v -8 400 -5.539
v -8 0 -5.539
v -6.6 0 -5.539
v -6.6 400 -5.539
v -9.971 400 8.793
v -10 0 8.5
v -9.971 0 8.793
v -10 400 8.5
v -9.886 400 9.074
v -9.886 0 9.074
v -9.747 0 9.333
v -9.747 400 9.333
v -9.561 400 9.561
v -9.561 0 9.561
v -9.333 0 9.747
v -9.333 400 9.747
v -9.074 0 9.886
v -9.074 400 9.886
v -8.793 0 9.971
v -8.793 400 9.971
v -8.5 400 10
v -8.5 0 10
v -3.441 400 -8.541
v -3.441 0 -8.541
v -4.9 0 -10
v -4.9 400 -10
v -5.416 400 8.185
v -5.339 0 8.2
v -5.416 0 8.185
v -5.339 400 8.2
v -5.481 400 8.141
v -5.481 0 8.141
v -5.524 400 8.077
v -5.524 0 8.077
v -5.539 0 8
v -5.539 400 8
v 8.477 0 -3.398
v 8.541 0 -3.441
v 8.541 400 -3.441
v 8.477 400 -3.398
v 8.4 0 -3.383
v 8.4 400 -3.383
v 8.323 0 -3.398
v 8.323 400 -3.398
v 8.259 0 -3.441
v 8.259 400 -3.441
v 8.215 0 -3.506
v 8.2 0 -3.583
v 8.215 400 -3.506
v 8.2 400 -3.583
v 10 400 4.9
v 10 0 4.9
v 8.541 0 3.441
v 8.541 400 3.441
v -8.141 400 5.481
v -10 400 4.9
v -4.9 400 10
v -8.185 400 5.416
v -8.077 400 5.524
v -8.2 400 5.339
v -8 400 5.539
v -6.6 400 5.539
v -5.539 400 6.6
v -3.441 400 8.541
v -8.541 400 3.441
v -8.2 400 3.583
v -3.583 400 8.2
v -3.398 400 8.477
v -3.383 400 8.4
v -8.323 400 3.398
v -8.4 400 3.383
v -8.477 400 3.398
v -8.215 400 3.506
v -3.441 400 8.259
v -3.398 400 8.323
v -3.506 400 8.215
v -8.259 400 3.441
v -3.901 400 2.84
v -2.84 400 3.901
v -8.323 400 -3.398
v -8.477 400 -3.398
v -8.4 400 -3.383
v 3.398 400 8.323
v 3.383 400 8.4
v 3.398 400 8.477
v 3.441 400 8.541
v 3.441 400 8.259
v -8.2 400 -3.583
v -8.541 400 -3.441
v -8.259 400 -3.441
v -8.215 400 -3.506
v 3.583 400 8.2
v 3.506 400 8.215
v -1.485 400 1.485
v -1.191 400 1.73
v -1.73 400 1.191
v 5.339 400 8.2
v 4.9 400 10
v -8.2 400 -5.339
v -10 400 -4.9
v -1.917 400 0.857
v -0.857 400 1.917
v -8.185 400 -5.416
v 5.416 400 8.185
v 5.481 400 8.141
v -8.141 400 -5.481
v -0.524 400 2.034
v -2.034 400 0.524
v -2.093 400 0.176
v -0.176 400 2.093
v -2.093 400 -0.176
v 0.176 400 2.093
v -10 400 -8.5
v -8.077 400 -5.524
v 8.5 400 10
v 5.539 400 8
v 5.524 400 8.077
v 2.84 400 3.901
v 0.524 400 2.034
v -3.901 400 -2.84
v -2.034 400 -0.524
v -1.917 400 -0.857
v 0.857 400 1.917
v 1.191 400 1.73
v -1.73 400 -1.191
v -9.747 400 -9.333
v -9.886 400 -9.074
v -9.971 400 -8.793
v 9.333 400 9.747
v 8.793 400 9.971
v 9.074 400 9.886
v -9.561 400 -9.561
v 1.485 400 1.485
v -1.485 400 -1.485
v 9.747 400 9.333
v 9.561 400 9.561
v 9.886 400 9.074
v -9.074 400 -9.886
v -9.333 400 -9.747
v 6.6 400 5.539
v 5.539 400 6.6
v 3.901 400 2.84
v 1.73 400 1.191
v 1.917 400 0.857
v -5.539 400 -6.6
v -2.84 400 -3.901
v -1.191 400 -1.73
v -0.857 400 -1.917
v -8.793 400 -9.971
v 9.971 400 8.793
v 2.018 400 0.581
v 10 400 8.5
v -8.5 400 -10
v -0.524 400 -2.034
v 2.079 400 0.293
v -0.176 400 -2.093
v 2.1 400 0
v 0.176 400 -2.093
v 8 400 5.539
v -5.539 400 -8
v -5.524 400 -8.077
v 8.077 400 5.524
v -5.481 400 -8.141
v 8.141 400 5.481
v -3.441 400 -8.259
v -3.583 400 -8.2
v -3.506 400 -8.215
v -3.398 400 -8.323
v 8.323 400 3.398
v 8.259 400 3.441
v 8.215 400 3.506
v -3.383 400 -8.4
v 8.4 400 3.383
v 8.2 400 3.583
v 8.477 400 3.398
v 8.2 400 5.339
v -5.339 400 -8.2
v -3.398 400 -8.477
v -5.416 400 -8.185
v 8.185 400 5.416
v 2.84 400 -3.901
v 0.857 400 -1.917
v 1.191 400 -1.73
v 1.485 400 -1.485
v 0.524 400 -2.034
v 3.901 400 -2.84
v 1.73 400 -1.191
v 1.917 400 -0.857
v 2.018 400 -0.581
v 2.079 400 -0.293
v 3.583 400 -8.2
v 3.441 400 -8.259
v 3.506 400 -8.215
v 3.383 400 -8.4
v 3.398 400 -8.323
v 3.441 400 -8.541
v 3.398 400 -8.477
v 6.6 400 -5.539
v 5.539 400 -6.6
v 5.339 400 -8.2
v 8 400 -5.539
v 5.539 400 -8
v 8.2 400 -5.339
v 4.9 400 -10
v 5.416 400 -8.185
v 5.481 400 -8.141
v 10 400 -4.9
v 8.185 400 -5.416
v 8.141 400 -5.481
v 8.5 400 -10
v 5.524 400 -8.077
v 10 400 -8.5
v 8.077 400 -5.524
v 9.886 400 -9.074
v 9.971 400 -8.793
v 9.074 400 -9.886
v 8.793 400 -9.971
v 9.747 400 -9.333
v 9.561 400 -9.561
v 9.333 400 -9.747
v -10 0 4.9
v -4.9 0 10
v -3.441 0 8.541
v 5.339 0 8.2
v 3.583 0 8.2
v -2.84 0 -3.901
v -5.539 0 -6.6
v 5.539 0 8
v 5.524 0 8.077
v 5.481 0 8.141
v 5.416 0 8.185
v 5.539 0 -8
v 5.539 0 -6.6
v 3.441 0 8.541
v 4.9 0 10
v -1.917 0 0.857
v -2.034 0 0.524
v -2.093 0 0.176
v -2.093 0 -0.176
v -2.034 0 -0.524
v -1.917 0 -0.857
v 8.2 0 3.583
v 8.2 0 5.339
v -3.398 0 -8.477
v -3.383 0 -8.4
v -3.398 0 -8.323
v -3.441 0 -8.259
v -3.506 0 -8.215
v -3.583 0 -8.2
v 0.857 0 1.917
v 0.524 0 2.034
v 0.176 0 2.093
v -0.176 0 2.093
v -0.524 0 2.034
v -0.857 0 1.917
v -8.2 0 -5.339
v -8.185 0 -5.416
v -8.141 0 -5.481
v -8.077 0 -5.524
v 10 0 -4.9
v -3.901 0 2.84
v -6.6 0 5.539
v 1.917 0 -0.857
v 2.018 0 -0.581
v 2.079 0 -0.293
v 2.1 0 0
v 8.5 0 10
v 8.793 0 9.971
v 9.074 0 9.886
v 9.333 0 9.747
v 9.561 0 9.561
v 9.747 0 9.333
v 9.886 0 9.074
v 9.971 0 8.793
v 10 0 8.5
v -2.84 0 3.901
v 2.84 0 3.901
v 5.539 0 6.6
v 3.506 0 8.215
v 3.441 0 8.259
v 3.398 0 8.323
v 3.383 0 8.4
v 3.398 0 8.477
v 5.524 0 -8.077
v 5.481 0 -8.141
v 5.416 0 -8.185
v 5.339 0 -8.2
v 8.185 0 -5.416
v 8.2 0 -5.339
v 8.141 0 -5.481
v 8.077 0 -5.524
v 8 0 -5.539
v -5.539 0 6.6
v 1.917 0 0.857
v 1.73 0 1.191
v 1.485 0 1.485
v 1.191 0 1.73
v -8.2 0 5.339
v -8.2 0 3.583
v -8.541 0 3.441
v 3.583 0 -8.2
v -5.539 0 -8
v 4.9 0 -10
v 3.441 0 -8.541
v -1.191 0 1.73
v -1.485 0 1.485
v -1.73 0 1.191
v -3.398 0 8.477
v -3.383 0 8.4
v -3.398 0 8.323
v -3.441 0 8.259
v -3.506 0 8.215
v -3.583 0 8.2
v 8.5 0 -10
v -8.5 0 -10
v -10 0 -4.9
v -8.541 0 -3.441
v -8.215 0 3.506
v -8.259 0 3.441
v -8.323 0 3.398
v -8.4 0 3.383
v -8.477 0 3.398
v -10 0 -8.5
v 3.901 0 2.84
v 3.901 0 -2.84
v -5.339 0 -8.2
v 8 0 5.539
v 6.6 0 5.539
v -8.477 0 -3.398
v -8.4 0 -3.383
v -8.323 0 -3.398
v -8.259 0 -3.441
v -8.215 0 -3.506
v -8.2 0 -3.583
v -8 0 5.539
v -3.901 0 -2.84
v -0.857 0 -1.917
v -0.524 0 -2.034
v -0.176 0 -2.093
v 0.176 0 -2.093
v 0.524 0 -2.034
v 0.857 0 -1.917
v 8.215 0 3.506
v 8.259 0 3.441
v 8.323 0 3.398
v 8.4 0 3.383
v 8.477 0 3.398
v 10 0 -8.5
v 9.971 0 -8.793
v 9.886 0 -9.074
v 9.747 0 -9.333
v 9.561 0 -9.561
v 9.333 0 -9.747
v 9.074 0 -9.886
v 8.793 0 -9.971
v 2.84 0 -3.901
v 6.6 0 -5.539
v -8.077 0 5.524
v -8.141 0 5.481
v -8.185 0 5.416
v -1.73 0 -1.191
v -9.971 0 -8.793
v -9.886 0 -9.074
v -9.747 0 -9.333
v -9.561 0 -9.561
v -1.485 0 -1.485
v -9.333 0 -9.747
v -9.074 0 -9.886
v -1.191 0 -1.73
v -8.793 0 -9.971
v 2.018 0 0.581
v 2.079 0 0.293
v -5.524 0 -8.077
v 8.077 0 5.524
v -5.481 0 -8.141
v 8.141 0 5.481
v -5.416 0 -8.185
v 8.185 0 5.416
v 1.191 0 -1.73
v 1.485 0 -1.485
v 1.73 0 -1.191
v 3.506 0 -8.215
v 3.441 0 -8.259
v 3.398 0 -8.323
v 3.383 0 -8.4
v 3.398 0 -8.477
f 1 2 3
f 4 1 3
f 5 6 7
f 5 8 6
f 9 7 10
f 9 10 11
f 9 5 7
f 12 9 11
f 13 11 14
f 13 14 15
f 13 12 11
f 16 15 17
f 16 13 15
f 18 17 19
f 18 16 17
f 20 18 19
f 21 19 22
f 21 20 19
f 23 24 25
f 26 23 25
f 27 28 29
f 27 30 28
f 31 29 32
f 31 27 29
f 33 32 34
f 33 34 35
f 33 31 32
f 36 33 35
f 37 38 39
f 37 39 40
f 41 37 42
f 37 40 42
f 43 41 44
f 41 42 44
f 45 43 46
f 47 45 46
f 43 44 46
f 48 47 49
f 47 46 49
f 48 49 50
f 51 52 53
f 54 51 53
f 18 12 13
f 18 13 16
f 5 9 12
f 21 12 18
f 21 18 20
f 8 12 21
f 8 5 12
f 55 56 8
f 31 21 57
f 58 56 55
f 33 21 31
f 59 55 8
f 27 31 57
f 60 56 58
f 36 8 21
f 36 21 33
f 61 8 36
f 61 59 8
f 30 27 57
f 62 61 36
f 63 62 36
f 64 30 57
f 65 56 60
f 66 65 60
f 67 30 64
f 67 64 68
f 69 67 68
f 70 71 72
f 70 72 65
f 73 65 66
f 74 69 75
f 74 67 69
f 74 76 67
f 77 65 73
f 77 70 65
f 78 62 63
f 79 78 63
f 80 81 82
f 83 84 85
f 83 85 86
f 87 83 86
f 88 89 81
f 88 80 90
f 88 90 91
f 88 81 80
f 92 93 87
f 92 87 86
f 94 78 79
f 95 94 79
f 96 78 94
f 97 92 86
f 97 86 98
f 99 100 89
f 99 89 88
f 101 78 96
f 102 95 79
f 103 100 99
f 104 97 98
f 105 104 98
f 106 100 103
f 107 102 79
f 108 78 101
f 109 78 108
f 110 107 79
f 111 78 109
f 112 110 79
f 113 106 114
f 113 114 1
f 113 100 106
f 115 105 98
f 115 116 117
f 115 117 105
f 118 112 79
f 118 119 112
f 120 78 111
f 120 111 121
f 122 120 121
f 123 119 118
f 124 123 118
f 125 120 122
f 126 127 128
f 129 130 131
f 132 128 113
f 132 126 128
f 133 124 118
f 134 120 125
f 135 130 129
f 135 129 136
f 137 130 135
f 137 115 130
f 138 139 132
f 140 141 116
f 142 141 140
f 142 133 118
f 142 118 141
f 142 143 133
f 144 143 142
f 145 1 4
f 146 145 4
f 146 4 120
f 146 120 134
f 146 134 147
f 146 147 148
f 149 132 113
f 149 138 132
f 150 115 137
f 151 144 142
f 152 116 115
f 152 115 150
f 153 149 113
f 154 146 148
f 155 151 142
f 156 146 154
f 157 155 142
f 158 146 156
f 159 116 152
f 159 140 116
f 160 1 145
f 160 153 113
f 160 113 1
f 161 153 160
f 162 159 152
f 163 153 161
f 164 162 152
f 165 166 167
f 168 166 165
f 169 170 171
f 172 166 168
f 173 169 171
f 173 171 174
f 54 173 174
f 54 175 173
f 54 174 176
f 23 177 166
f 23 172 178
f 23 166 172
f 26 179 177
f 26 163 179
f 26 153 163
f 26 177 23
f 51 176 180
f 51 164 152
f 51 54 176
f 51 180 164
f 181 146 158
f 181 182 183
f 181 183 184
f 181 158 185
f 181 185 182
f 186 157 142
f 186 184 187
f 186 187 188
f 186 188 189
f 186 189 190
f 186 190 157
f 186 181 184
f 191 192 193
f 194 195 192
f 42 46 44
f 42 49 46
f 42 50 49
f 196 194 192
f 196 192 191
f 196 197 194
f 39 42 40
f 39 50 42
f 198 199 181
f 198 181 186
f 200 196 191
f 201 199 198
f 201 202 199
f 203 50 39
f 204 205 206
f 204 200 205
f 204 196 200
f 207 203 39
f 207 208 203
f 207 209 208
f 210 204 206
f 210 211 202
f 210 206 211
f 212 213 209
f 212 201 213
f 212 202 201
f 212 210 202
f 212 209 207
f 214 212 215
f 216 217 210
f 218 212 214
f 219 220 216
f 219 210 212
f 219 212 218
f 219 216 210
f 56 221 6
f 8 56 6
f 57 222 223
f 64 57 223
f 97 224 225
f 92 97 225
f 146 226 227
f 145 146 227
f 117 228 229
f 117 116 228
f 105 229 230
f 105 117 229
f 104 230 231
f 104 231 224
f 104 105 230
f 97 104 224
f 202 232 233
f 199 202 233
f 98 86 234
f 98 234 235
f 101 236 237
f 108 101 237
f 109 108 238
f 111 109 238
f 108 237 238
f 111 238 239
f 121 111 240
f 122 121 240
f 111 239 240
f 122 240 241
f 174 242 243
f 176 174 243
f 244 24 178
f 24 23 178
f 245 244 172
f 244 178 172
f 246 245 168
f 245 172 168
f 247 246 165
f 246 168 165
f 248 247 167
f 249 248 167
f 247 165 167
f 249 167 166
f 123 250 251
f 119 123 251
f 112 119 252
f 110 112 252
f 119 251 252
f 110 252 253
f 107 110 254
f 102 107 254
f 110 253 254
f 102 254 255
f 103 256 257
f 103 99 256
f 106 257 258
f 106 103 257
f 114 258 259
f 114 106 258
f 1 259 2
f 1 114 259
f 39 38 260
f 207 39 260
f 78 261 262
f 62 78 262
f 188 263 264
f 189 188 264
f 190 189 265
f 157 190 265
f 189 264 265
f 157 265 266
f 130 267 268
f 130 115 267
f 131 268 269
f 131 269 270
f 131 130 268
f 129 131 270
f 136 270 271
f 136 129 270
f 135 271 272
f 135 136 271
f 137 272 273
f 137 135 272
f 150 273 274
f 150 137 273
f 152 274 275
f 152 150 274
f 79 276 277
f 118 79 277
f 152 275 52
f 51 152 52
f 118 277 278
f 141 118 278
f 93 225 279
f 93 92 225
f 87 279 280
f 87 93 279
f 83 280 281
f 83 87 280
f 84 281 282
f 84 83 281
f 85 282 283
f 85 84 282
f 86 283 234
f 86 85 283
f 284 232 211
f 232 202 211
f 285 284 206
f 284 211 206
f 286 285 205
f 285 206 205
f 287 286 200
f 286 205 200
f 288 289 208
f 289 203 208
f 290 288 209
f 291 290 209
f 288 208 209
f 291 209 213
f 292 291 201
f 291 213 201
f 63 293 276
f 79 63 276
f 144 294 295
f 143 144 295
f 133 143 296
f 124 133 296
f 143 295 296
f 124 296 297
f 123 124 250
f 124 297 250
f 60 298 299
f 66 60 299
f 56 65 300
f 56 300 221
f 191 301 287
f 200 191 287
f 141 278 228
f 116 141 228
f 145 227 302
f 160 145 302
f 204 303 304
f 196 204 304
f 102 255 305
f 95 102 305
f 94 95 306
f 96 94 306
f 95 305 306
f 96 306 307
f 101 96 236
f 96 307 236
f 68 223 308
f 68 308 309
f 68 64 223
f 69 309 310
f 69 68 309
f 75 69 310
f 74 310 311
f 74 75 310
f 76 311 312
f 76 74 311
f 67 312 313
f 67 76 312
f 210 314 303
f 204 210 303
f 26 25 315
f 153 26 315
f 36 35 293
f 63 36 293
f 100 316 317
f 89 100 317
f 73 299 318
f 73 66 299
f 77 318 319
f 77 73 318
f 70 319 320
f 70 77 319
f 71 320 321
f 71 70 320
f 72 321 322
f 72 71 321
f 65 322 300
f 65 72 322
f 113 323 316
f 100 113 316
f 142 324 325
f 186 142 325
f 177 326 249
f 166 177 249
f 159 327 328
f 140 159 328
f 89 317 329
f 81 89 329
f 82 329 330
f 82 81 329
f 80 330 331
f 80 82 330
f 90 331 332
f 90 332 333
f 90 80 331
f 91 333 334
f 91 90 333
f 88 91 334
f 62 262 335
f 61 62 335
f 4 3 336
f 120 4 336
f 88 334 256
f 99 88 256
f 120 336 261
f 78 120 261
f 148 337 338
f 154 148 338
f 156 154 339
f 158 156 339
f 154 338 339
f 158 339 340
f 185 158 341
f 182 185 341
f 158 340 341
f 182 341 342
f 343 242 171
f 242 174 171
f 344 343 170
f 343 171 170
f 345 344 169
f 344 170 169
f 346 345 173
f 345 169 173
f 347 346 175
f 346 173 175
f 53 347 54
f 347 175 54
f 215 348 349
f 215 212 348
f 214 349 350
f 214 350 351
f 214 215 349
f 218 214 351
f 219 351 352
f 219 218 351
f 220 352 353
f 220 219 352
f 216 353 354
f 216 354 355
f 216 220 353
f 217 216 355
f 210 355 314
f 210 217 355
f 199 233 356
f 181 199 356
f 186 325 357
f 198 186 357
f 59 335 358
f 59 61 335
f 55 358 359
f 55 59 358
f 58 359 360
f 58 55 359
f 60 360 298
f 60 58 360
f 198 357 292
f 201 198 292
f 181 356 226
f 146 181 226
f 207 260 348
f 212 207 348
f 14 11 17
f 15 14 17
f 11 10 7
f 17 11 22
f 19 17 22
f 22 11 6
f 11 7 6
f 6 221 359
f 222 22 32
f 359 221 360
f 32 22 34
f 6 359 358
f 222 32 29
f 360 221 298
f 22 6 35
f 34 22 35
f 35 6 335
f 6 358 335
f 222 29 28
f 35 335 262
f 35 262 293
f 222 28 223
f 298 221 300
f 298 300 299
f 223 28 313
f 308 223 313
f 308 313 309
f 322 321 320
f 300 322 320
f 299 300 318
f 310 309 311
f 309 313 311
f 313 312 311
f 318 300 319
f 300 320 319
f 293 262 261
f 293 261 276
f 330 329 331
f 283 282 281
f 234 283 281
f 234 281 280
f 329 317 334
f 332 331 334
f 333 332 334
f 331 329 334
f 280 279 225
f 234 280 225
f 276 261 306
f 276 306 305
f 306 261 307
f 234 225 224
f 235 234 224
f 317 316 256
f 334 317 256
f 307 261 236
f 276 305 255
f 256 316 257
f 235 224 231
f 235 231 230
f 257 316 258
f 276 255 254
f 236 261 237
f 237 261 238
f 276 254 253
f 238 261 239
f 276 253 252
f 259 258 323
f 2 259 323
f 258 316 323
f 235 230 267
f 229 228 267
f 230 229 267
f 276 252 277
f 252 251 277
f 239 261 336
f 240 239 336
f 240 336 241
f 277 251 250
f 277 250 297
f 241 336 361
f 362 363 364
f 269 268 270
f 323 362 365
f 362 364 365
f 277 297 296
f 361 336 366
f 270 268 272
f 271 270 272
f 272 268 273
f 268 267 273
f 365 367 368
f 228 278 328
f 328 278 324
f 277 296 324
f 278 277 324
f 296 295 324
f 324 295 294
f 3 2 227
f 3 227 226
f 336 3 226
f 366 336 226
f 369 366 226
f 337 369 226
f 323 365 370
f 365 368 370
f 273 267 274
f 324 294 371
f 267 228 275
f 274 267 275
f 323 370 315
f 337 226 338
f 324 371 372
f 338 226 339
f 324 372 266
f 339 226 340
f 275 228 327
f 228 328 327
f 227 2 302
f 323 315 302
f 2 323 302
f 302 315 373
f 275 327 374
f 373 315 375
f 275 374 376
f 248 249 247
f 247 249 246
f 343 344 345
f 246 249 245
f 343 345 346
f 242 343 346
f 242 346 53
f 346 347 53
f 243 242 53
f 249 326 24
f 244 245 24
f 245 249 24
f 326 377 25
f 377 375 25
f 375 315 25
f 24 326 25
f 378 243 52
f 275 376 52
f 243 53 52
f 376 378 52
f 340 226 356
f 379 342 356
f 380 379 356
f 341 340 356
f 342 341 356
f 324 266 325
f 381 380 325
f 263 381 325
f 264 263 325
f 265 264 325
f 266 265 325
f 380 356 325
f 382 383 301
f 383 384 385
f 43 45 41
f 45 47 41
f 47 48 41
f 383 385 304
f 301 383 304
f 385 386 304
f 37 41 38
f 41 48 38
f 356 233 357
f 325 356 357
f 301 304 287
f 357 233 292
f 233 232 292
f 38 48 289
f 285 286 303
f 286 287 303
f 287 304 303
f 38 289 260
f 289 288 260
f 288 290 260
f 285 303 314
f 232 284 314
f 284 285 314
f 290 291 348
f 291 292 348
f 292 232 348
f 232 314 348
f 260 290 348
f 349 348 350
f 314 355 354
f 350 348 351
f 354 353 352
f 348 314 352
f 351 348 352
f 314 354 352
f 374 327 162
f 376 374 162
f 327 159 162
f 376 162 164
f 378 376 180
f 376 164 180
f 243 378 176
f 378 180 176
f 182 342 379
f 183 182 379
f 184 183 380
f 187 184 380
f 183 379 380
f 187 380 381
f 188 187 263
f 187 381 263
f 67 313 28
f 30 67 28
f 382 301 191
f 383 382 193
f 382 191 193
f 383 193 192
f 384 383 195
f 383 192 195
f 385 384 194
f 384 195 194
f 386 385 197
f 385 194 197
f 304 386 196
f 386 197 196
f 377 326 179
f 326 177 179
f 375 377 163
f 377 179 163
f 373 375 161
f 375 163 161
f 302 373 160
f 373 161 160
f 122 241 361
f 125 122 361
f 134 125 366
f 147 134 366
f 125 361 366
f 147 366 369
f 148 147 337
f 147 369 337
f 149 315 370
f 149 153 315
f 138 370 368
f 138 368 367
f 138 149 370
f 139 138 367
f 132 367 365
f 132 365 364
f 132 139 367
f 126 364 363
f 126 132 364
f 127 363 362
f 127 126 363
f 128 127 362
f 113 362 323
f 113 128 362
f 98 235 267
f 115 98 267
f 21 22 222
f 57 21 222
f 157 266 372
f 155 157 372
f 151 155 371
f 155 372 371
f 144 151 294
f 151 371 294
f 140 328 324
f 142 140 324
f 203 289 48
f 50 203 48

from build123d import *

# Parameters (mm, degrees)
SALIENTE_EXTRUIR1_DEPTH = 400
REDONDEO1_R             = 1.5
REDONDEO2_R             = 0.2


with BuildPart() as part:
    # Croquis1 → Saliente-Extruir1 (new body)
    with BuildSketch(Plane(origin=(0, 0, 0), x_dir=(1, 0, 0), z_dir=(0, 1, 0))):
        with BuildLine():
            Line((-4.9, 10), (-10, 10))
            Line((-10, 10), (-10, 4.9))
            Line((-10, 4.9), (-8.2, 3.1))
            Line((-8.2, 3.1), (-8.2, 5.539339828))
            Line((-8.2, 5.539339828), (-6.6, 5.539339828))
            Line((-6.6, 5.539339828), (-3.900660172, 2.84))
            Line((-3.900660172, 2.84), (-1.917323237, 0.856663065))
            ThreePointArc((-1.917323237, 0.856663065), (-1.48492424, 1.48492424), (-0.856663065, 1.917323237))
            Line((-0.856663065, 1.917323237), (-2.84, 3.900660172))
            Line((-2.84, 3.900660172), (-5.539339828, 6.6))
            Line((-5.539339828, 6.6), (-5.539339828, 8.2))
            Line((-5.539339828, 8.2), (-3.1, 8.2))
            Line((-3.1, 8.2), (-4.9, 10))
        make_face()
        with BuildLine():
            Line((-8.2, -3.1), (-10, -4.9))
            Line((-10, -4.9), (-10, -10))
            Line((-10, -10), (-4.9, -10))
            Line((-4.9, -10), (-3.1, -8.2))
            Line((-3.1, -8.2), (-5.539339828, -8.2))
            Line((-5.539339828, -8.2), (-5.539339828, -6.6))
            Line((-5.539339828, -6.6), (-2.84, -3.900660172))
            Line((-2.84, -3.900660172), (-0.856663065, -1.917323237))
            ThreePointArc((-0.856663065, -1.917323237), (-1.48492424, -1.48492424), (-1.917323237, -0.856663065))
            Line((-1.917323237, -0.856663065), (-3.900660172, -2.84))
            Line((-3.900660172, -2.84), (-6.6, -5.539339828))
            Line((-6.6, -5.539339828), (-8.2, -5.539339828))
            Line((-8.2, -5.539339828), (-8.2, -3.1))
        make_face()
        with BuildLine():
            Line((10, -10), (10, -4.9))
            Line((10, -4.9), (8.2, -3.1))
            Line((8.2, -3.1), (8.2, -5.539339828))
            Line((8.2, -5.539339828), (6.6, -5.539339828))
            Line((6.6, -5.539339828), (3.900660172, -2.84))
            Line((3.900660172, -2.84), (1.917323237, -0.856663065))
            ThreePointArc((1.917323237, -0.856663065), (1.48492424, -1.48492424), (0.856663065, -1.917323237))
            Line((0.856663065, -1.917323237), (2.84, -3.900660172))
            Line((2.84, -3.900660172), (5.539339828, -6.6))
            Line((5.539339828, -6.6), (5.539339828, -8.2))
            Line((5.539339828, -8.2), (3.1, -8.2))
            Line((3.1, -8.2), (4.9, -10))
            Line((4.9, -10), (10, -10))
        make_face()
        with BuildLine():
            Line((10, 10), (4.9, 10))
            Line((4.9, 10), (3.1, 8.2))
            Line((3.1, 8.2), (5.539339828, 8.2))
            Line((5.539339828, 8.2), (5.539339828, 6.6))
            Line((5.539339828, 6.6), (2.84, 3.900660172))
            Line((2.84, 3.900660172), (0.856663065, 1.917323237))
            ThreePointArc((0.856663065, 1.917323237), (1.48492424, 1.48492424), (1.917323237, 0.856663065))
            Line((1.917323237, 0.856663065), (3.900660172, 2.84))
            Line((3.900660172, 2.84), (6.6, 5.539339828))
            Line((6.6, 5.539339828), (8.2, 5.539339828))
            Line((8.2, 5.539339828), (8.2, 3.1))
            Line((8.2, 3.1), (10, 4.9))
            Line((10, 4.9), (10, 10))
        make_face()
        with BuildLine():
            Line((-1.917323237, 0.856663065), (-3.900660172, 2.84))
            Line((-3.900660172, 2.84), (-3.900660172, -2.84))
            Line((-3.900660172, -2.84), (-1.917323237, -0.856663065))
            ThreePointArc((-1.917323237, -0.856663065), (-2.1, 0), (-1.917323237, 0.856663065))
        make_face()
        with BuildLine():
            Line((-0.856663065, -1.917323237), (-2.84, -3.900660172))
            Line((-2.84, -3.900660172), (2.84, -3.900660172))
            Line((2.84, -3.900660172), (0.856663065, -1.917323237))
            ThreePointArc((0.856663065, -1.917323237), (0, -2.1), (-0.856663065, -1.917323237))
        make_face()
        with BuildLine():
            Line((3.900660172, -2.84), (3.900660172, 2.84))
            Line((3.900660172, 2.84), (1.917323237, 0.856663065))
            ThreePointArc((1.917323237, 0.856663065), (2.053823118, 0.437961872), (2.1, 0))
            ThreePointArc((2.1, 0), (2.053823118, -0.437961872), (1.917323237, -0.856663065))
            Line((1.917323237, -0.856663065), (3.900660172, -2.84))
        make_face()
        with BuildLine():
            Line((2.84, 3.900660172), (-2.84, 3.900660172))
            Line((-2.84, 3.900660172), (-0.856663065, 1.917323237))
            ThreePointArc((-0.856663065, 1.917323237), (0, 2.1), (0.856663065, 1.917323237))
            Line((0.856663065, 1.917323237), (2.84, 3.900660172))
        make_face()
    extrude(amount=SALIENTE_EXTRUIR1_DEPTH)

    # Redondeo1
    redondeo1_edges = [part.edges().sort_by_distance(p)[0] for p in [
        (-10, 200, 10),
        (-10, 200, -10),
        (10, 200, -10),
        (10, 200, 10),
    ]]
    fillet(redondeo1_edges, radius=REDONDEO1_R)

    # Redondeo2
    redondeo2_edges = [part.edges().sort_by_distance(p)[0] for p in [
        (-5.539339828, 200, 8.2),
        (-3.1, 200, 8.2),
        (-8.2, 200, 3.1),
        (-8.2, 200, 5.539339828),
        (-8.2, 200, -5.539339828),
        (-8.2, 200, -3.1),
        (-3.1, 200, -8.2),
        (-5.539339828, 200, -8.2),
        (5.539339828, 200, -8.2),
        (3.1, 200, -8.2),
        (8.2, 200, -3.1),
        (8.2, 200, -5.539339828),
        (8.2, 200, 5.539339828),
        (8.2, 200, 3.1),
        (3.1, 200, 8.2),
        (5.539339828, 200, 8.2),
    ]]
    fillet(redondeo2_edges, radius=REDONDEO2_R)


solid = part.part
